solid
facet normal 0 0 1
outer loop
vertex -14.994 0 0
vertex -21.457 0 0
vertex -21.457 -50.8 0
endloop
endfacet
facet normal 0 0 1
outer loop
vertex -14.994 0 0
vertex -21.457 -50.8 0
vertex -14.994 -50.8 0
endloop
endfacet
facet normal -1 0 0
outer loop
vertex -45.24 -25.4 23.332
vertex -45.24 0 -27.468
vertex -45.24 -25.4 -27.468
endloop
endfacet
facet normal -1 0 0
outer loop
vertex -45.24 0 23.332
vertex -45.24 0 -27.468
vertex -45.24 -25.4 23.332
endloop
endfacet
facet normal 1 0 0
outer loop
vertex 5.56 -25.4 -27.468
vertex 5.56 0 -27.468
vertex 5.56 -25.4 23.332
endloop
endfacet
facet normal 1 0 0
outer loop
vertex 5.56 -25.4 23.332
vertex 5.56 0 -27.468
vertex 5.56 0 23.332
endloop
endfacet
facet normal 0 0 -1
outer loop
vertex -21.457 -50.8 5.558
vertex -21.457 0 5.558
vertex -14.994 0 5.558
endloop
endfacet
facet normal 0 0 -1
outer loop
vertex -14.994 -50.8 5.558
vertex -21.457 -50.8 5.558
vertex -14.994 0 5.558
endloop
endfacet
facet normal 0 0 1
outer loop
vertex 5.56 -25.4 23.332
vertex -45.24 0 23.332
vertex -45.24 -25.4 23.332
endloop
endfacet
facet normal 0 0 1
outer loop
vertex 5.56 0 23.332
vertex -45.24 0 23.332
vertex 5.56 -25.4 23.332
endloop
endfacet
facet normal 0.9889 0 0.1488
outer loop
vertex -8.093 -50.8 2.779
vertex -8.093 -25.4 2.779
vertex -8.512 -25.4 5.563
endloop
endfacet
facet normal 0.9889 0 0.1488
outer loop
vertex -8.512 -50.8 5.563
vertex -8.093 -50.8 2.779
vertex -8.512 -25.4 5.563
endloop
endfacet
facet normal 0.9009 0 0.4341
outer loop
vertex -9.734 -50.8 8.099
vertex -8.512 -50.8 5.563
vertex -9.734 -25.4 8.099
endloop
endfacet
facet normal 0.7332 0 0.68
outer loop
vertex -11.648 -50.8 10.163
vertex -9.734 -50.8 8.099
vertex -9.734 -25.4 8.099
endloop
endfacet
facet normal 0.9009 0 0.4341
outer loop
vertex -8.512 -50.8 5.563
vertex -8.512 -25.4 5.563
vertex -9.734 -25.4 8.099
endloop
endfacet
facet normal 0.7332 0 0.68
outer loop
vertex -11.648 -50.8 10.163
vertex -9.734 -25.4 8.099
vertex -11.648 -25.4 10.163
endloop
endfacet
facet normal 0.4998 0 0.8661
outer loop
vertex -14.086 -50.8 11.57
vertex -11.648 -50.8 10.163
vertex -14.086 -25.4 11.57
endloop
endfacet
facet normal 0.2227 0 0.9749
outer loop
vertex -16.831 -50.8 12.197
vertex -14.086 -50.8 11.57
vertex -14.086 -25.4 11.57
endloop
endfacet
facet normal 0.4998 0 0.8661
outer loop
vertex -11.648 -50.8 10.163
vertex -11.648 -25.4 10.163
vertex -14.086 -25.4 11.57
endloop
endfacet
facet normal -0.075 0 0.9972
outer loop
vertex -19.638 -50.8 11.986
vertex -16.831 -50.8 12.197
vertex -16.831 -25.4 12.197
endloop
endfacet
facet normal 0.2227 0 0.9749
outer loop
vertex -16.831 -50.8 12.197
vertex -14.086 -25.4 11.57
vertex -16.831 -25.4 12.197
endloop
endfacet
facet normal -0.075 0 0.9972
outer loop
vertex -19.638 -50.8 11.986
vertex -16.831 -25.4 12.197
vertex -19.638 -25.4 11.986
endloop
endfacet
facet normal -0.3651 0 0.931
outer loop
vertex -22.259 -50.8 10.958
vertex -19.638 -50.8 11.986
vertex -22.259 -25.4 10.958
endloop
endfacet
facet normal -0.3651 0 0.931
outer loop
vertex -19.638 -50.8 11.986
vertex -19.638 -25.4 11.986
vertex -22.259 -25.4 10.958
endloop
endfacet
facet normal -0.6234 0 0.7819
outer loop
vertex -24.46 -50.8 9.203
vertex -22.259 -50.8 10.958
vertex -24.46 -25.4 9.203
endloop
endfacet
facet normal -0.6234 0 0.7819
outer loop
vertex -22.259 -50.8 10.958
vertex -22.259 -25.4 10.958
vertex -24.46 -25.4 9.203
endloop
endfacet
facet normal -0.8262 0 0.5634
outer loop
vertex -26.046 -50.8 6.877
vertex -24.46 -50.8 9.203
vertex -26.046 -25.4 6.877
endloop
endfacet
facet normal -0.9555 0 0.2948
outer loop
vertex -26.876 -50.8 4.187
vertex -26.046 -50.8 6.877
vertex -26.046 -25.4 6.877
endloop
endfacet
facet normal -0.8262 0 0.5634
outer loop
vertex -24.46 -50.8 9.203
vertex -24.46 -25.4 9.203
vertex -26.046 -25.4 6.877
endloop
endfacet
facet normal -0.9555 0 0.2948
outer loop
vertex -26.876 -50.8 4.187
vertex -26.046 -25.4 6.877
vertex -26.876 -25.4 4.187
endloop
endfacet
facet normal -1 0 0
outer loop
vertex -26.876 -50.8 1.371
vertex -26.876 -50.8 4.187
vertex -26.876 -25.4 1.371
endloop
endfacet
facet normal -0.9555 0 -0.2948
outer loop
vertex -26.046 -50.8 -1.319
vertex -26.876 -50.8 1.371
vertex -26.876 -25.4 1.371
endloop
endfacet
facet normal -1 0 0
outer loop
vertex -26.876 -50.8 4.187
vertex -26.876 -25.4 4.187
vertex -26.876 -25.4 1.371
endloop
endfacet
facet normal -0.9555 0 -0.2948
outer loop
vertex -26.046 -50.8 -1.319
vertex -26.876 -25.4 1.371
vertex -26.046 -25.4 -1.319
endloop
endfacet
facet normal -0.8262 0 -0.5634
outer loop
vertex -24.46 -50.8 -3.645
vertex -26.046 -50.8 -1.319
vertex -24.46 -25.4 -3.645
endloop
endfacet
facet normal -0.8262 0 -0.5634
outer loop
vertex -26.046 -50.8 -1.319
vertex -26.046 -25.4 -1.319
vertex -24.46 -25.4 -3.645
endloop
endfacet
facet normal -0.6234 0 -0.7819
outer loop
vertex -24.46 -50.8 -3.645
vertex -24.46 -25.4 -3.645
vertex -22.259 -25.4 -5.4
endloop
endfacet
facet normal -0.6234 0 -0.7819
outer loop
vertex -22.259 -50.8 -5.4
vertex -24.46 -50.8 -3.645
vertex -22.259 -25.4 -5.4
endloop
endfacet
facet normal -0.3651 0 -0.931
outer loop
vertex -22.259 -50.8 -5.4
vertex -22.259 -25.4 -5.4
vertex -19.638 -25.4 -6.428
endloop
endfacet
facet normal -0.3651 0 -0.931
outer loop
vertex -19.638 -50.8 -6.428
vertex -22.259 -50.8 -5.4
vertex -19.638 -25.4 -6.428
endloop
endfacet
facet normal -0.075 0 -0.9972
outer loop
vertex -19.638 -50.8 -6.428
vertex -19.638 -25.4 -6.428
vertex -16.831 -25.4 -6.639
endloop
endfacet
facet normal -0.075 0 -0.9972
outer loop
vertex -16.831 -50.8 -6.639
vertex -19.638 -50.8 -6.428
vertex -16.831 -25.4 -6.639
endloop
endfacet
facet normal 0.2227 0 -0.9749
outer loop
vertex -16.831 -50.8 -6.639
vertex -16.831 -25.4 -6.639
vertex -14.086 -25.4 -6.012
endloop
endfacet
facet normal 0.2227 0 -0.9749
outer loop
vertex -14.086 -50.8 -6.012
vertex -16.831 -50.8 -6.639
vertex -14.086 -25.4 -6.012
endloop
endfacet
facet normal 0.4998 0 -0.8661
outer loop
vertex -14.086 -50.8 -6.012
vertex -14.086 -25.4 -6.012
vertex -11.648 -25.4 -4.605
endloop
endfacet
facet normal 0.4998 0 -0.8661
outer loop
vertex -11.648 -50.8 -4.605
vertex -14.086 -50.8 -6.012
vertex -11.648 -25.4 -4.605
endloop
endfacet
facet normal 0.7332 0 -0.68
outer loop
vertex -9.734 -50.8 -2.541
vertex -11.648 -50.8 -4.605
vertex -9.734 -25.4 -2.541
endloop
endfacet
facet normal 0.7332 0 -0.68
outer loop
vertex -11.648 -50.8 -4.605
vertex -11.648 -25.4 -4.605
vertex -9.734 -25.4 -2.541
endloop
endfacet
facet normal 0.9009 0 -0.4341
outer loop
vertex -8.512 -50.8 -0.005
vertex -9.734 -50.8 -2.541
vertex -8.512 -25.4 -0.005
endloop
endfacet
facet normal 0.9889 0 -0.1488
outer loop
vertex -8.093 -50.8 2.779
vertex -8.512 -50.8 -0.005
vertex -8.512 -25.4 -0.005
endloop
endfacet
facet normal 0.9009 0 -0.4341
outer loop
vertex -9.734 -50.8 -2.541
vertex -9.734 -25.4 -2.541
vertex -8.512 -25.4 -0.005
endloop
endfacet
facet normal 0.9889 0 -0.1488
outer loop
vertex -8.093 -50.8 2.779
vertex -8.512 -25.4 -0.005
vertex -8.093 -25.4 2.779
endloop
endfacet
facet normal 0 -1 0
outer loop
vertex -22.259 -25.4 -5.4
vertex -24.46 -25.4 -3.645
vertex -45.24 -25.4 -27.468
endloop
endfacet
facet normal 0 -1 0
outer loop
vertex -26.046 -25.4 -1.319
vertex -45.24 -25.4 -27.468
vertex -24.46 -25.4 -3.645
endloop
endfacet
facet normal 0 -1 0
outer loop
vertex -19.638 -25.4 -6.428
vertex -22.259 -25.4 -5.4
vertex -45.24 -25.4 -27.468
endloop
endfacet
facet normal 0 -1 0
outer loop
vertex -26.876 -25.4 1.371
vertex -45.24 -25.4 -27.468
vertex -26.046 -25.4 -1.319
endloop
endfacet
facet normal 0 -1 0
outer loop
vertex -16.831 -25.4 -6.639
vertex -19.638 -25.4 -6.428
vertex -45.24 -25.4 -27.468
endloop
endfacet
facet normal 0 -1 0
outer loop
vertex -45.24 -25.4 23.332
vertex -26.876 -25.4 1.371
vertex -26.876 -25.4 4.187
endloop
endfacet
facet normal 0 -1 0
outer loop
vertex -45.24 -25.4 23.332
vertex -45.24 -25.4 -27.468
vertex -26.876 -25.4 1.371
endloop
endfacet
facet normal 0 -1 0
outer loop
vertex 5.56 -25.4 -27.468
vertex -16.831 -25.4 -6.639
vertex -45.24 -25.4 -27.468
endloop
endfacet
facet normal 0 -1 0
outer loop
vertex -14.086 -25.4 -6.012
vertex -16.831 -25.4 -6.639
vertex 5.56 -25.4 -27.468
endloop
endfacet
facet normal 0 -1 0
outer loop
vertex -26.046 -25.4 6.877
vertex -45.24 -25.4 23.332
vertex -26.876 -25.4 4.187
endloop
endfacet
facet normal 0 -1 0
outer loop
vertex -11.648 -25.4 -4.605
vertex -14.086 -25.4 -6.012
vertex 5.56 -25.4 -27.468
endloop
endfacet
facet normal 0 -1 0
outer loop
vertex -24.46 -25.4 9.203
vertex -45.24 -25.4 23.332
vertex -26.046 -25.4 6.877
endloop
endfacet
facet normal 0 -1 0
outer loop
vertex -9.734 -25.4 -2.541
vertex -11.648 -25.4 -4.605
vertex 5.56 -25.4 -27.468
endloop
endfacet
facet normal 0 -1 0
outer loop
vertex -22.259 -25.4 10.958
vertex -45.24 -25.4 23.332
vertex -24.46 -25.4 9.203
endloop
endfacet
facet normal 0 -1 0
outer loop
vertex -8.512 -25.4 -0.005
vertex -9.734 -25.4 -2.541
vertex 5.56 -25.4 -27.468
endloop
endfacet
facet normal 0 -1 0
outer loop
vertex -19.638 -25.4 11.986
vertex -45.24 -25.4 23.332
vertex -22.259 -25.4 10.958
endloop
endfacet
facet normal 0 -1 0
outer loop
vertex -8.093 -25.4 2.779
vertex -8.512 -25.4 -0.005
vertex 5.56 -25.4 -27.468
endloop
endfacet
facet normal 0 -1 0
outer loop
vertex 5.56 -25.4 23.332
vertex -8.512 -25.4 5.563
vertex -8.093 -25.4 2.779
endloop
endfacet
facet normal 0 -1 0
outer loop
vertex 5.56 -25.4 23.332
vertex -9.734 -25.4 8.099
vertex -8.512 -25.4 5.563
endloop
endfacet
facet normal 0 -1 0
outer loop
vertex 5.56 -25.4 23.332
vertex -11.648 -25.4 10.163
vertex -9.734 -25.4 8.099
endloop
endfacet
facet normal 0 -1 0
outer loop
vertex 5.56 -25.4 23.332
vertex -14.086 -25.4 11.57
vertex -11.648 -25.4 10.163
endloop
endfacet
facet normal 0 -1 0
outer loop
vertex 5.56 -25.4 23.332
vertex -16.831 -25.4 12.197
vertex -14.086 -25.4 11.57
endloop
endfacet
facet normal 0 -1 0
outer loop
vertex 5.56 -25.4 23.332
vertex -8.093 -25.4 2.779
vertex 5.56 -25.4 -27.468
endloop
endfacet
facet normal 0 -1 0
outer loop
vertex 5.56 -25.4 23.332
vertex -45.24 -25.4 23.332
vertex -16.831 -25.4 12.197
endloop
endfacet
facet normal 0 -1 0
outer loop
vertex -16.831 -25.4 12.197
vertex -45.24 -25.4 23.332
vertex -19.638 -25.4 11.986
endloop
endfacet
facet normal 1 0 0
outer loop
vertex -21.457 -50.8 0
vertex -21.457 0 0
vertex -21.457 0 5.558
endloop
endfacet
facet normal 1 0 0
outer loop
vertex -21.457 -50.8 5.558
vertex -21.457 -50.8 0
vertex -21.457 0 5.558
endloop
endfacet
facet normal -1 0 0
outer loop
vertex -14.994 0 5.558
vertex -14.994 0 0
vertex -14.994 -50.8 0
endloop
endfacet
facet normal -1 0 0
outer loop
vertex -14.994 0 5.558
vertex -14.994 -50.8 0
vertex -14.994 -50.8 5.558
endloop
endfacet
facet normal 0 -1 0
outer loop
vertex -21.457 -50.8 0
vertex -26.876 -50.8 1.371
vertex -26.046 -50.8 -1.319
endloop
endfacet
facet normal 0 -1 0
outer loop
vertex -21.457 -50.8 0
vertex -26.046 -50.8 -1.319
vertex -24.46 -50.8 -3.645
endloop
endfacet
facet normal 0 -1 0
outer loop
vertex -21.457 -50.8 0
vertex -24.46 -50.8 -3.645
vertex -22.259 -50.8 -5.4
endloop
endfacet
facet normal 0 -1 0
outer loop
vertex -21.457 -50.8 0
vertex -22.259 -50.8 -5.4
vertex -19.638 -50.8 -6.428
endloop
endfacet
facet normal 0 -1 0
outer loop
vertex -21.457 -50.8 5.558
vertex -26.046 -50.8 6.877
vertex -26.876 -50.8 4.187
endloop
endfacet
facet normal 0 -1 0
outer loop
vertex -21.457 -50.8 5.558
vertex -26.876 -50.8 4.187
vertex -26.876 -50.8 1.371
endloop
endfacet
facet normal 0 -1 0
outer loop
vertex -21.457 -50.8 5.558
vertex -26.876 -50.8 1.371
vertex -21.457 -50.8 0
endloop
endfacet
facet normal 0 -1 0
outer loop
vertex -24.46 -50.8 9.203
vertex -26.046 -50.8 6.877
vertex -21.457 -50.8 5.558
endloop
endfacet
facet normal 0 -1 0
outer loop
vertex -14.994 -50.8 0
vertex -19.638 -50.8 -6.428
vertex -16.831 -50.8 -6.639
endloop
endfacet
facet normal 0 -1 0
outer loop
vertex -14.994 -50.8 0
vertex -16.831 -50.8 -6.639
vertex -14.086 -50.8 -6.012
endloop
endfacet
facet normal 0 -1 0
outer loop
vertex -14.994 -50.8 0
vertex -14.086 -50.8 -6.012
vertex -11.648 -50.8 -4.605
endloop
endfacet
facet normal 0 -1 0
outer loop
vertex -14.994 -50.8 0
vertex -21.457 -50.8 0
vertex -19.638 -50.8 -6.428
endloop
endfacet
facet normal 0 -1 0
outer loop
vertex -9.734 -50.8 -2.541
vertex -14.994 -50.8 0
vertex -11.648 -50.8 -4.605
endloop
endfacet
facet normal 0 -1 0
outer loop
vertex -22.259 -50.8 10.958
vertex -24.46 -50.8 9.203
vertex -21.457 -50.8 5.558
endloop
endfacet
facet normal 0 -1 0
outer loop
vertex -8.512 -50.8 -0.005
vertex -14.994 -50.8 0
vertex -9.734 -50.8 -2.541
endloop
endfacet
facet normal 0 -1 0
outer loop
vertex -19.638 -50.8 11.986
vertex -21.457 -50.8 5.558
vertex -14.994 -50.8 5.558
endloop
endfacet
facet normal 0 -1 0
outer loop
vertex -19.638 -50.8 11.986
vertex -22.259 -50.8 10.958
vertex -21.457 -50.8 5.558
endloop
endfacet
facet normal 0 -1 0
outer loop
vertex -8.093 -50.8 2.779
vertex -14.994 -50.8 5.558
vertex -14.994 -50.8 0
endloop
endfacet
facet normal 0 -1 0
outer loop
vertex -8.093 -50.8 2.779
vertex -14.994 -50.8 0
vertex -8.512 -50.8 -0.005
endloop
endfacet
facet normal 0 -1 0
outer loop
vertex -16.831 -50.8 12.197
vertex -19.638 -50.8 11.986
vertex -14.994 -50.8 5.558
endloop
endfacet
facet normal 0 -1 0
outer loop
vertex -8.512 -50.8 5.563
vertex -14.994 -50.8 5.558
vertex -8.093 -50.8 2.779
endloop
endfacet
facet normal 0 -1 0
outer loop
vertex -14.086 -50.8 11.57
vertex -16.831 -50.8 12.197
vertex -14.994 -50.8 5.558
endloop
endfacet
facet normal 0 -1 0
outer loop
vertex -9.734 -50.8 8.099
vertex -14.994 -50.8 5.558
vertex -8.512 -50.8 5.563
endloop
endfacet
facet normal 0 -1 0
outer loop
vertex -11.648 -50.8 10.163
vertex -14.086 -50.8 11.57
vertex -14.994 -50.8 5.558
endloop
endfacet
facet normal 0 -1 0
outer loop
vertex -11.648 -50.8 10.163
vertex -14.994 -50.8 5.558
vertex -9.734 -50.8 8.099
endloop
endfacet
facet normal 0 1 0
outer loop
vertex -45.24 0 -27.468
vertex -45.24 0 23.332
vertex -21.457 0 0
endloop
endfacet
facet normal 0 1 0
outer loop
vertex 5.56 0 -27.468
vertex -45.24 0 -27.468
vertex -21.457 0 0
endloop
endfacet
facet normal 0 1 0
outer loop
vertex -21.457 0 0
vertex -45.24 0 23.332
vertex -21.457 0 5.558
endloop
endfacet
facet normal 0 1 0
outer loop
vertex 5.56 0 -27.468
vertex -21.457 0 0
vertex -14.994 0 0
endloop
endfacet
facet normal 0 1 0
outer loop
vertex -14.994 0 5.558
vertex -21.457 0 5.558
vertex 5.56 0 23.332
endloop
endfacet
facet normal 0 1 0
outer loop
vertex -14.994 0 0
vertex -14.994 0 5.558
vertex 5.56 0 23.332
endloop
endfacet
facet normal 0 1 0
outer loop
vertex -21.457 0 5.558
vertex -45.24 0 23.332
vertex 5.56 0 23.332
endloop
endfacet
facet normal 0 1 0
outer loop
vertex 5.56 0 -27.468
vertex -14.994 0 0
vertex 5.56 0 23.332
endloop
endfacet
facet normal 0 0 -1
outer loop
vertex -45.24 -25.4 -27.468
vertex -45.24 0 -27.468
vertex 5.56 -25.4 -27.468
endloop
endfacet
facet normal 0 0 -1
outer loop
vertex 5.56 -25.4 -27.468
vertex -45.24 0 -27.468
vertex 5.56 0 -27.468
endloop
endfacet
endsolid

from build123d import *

# Parameters (mm, degrees)
F0_W     = 50.8
F0_H     = 50.8
F0_W_2   = 6.462844
F0_H_2   = 5.558045
F1_DEPTH = 25.4
F2_R     = 9.444234
F3_DEPTH = 25.4
F4_DEPTH = 50.801


with BuildPart() as f1:
    # F0 (on Front) → F1 (new body)
    with BuildSketch(Plane.XZ):
        with Locations((-19.839903, -2.06811)):
            Rectangle(F0_W, F0_H)
        with Locations((-18.225218, 2.779022)):
            Rectangle(F0_W_2, F0_H_2, mode=Mode.SUBTRACT)
    extrude(amount=F1_DEPTH)

    # F2 (on face) → F3 (join)
    with BuildSketch(Plane.XZ.offset(25.4)):
        with Locations((-17.536797, 2.779023)):
            Circle(F2_R)
    extrude(amount=F3_DEPTH)

    # F0 (on Front) → F4 (cut, through all)
    with BuildSketch(Plane.XZ):
        with Locations((-18.225218, 2.779022)):
            Rectangle(F0_W_2, F0_H_2)
    extrude(amount=F4_DEPTH, mode=Mode.SUBTRACT)


solid = f1.part
